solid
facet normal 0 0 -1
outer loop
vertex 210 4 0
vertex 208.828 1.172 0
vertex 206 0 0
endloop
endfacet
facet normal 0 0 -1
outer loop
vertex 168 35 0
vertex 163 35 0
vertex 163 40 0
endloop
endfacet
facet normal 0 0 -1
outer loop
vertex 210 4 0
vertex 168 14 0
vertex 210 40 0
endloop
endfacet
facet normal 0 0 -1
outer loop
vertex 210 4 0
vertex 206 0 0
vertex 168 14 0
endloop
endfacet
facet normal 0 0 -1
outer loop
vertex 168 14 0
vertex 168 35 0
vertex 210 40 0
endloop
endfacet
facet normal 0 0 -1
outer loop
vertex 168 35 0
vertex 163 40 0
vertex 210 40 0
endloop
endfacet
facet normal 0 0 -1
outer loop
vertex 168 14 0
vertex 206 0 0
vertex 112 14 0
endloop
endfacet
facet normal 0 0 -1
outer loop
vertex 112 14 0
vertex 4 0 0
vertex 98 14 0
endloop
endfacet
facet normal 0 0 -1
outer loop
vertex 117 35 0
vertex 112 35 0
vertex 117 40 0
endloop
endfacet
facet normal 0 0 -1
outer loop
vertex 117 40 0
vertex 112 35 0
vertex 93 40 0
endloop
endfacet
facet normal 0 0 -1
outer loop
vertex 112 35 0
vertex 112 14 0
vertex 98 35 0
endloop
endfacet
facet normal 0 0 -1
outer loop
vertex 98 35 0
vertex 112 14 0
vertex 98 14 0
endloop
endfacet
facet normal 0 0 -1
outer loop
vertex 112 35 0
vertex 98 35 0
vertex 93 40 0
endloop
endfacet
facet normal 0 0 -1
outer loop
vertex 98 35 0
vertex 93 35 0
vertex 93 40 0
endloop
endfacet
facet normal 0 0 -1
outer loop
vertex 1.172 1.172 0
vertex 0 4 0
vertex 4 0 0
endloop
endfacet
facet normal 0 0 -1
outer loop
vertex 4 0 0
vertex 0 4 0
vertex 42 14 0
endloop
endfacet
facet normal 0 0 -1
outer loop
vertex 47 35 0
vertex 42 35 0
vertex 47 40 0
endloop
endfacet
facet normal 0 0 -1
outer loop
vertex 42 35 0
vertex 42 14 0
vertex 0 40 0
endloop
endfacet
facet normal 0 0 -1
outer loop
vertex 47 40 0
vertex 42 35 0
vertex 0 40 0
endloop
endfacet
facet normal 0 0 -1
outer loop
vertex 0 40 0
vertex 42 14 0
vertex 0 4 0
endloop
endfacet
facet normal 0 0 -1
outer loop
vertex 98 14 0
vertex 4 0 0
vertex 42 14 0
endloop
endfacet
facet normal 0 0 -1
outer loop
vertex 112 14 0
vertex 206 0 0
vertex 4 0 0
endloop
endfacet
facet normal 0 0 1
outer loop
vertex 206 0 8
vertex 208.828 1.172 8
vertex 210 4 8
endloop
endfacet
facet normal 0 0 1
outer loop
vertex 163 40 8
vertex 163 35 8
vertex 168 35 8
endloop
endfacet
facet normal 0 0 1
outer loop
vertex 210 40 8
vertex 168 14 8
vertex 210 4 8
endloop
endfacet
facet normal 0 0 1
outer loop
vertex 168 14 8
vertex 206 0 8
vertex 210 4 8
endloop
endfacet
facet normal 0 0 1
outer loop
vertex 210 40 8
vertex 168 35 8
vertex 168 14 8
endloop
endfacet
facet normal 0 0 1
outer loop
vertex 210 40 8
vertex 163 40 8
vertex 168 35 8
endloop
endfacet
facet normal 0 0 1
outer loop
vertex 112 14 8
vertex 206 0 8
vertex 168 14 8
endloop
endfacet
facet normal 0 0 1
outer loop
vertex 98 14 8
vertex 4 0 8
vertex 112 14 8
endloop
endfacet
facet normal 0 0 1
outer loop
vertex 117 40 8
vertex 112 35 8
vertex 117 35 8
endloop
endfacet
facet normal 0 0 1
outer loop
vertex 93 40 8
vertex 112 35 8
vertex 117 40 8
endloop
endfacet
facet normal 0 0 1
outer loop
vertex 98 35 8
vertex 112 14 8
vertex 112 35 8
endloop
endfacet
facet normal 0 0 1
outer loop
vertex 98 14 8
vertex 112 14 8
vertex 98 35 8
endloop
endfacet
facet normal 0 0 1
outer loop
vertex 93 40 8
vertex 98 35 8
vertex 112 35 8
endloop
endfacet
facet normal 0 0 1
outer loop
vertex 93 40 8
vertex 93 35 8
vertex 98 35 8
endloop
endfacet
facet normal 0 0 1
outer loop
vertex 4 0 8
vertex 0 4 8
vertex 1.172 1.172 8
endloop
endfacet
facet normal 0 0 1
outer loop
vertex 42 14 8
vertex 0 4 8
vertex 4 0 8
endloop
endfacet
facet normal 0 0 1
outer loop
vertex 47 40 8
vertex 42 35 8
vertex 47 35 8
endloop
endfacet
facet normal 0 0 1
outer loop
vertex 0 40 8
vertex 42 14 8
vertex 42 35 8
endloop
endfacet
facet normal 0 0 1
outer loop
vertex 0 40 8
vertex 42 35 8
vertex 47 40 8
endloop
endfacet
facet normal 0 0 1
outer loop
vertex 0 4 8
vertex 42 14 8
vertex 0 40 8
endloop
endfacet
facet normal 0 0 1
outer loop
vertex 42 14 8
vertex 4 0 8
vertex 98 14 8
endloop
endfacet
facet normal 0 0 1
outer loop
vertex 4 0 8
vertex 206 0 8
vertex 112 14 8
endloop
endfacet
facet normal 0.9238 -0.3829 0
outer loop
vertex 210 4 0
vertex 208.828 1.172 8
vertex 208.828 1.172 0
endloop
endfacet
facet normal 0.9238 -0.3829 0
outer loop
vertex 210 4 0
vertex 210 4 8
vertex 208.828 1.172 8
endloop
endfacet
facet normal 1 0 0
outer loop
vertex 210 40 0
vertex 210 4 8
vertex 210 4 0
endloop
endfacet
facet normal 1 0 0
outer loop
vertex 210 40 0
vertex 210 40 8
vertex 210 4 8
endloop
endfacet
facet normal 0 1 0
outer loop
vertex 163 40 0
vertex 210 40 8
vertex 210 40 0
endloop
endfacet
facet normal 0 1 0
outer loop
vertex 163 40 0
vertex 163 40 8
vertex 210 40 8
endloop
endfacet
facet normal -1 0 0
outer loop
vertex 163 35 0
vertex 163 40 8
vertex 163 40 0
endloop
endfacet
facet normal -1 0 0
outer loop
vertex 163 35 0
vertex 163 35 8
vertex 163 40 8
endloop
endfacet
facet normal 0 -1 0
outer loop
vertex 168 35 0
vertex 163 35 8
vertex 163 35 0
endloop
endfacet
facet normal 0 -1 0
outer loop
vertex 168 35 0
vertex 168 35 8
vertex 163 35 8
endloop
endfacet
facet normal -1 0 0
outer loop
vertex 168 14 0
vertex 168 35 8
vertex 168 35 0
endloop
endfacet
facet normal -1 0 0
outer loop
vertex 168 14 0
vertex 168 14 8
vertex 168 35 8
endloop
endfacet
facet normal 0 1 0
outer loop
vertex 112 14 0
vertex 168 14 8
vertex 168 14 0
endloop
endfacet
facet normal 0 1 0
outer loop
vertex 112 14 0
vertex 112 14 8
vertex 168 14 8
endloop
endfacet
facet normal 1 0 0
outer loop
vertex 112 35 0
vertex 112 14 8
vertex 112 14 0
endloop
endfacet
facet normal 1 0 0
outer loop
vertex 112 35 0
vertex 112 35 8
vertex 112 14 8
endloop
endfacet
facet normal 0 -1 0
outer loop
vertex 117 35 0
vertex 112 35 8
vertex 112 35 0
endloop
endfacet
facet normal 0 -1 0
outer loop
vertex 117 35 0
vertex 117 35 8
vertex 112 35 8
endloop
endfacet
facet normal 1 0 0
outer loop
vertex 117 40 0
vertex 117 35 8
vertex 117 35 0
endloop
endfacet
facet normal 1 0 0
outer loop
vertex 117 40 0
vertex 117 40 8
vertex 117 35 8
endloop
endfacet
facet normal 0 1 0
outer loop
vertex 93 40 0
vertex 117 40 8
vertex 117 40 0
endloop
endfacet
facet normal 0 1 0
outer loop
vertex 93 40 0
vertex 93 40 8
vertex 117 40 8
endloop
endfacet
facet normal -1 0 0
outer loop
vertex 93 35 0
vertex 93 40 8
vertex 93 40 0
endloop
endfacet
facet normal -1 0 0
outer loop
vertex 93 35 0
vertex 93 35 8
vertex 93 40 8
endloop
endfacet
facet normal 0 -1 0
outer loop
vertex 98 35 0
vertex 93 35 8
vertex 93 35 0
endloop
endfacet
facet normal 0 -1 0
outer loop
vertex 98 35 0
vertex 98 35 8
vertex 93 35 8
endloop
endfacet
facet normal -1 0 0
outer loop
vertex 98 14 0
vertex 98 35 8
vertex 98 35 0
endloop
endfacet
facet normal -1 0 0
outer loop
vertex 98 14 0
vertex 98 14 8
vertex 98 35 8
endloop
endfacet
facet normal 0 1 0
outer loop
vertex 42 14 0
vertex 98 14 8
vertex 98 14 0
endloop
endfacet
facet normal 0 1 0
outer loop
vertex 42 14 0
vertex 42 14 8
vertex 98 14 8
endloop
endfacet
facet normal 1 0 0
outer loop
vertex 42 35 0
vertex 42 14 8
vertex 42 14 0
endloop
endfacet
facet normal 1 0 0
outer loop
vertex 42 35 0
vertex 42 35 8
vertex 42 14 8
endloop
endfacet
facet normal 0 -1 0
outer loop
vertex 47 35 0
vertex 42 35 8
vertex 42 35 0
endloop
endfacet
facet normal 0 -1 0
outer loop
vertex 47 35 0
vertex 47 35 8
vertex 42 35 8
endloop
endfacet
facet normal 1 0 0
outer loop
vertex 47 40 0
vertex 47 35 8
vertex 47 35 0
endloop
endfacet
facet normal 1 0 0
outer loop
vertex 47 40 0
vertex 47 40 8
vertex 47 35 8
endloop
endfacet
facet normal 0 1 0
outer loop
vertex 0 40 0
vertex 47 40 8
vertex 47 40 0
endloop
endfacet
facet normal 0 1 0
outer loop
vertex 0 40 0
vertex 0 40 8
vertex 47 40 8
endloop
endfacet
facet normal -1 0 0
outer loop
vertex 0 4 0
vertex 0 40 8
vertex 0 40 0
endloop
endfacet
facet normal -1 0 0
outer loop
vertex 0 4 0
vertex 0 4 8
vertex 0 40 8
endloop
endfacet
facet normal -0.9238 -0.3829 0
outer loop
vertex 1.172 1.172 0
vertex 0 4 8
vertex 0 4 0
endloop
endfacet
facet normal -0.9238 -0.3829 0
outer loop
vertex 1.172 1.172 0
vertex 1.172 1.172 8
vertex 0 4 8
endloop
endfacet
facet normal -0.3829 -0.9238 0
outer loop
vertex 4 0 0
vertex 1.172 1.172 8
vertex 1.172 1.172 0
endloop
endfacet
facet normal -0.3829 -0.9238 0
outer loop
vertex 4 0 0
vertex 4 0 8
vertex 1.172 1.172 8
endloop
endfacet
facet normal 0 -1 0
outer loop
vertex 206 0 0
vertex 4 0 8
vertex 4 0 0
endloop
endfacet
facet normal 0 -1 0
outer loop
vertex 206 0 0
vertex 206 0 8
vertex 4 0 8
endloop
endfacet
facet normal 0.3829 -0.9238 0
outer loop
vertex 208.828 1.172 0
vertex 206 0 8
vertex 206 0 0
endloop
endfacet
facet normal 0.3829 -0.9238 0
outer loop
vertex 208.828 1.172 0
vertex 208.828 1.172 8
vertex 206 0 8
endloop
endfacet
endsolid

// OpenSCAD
$fn = 32;

// ----------------------------------------------------------------------
// Oversize slot bar: 210 mm bar with 2 oversize windows
// ----------------------------------------------------------------------

// --- parameters (mm) ---
profile_height = 8;       // extrusion height
profile_points = 24;      // points of the closed outline

profile = [[0, 4], [1.172, 1.172], [4, 0], [206, 0], [208.828, 1.172], [210, 4], [210, 40], [163, 40], [163, 35], [168, 35], [168, 14], [112, 14], [112, 35], [117, 35], [117, 40], [93, 40], [93, 35], [98, 35], [98, 14], [42, 14], [42, 35], [47, 35], [47, 40], [0, 40]];  // single closed polygon, 24 points, counter clockwise

// --- the one profile operation ---
linear_extrude(height = profile_height) polygon(points = profile);
